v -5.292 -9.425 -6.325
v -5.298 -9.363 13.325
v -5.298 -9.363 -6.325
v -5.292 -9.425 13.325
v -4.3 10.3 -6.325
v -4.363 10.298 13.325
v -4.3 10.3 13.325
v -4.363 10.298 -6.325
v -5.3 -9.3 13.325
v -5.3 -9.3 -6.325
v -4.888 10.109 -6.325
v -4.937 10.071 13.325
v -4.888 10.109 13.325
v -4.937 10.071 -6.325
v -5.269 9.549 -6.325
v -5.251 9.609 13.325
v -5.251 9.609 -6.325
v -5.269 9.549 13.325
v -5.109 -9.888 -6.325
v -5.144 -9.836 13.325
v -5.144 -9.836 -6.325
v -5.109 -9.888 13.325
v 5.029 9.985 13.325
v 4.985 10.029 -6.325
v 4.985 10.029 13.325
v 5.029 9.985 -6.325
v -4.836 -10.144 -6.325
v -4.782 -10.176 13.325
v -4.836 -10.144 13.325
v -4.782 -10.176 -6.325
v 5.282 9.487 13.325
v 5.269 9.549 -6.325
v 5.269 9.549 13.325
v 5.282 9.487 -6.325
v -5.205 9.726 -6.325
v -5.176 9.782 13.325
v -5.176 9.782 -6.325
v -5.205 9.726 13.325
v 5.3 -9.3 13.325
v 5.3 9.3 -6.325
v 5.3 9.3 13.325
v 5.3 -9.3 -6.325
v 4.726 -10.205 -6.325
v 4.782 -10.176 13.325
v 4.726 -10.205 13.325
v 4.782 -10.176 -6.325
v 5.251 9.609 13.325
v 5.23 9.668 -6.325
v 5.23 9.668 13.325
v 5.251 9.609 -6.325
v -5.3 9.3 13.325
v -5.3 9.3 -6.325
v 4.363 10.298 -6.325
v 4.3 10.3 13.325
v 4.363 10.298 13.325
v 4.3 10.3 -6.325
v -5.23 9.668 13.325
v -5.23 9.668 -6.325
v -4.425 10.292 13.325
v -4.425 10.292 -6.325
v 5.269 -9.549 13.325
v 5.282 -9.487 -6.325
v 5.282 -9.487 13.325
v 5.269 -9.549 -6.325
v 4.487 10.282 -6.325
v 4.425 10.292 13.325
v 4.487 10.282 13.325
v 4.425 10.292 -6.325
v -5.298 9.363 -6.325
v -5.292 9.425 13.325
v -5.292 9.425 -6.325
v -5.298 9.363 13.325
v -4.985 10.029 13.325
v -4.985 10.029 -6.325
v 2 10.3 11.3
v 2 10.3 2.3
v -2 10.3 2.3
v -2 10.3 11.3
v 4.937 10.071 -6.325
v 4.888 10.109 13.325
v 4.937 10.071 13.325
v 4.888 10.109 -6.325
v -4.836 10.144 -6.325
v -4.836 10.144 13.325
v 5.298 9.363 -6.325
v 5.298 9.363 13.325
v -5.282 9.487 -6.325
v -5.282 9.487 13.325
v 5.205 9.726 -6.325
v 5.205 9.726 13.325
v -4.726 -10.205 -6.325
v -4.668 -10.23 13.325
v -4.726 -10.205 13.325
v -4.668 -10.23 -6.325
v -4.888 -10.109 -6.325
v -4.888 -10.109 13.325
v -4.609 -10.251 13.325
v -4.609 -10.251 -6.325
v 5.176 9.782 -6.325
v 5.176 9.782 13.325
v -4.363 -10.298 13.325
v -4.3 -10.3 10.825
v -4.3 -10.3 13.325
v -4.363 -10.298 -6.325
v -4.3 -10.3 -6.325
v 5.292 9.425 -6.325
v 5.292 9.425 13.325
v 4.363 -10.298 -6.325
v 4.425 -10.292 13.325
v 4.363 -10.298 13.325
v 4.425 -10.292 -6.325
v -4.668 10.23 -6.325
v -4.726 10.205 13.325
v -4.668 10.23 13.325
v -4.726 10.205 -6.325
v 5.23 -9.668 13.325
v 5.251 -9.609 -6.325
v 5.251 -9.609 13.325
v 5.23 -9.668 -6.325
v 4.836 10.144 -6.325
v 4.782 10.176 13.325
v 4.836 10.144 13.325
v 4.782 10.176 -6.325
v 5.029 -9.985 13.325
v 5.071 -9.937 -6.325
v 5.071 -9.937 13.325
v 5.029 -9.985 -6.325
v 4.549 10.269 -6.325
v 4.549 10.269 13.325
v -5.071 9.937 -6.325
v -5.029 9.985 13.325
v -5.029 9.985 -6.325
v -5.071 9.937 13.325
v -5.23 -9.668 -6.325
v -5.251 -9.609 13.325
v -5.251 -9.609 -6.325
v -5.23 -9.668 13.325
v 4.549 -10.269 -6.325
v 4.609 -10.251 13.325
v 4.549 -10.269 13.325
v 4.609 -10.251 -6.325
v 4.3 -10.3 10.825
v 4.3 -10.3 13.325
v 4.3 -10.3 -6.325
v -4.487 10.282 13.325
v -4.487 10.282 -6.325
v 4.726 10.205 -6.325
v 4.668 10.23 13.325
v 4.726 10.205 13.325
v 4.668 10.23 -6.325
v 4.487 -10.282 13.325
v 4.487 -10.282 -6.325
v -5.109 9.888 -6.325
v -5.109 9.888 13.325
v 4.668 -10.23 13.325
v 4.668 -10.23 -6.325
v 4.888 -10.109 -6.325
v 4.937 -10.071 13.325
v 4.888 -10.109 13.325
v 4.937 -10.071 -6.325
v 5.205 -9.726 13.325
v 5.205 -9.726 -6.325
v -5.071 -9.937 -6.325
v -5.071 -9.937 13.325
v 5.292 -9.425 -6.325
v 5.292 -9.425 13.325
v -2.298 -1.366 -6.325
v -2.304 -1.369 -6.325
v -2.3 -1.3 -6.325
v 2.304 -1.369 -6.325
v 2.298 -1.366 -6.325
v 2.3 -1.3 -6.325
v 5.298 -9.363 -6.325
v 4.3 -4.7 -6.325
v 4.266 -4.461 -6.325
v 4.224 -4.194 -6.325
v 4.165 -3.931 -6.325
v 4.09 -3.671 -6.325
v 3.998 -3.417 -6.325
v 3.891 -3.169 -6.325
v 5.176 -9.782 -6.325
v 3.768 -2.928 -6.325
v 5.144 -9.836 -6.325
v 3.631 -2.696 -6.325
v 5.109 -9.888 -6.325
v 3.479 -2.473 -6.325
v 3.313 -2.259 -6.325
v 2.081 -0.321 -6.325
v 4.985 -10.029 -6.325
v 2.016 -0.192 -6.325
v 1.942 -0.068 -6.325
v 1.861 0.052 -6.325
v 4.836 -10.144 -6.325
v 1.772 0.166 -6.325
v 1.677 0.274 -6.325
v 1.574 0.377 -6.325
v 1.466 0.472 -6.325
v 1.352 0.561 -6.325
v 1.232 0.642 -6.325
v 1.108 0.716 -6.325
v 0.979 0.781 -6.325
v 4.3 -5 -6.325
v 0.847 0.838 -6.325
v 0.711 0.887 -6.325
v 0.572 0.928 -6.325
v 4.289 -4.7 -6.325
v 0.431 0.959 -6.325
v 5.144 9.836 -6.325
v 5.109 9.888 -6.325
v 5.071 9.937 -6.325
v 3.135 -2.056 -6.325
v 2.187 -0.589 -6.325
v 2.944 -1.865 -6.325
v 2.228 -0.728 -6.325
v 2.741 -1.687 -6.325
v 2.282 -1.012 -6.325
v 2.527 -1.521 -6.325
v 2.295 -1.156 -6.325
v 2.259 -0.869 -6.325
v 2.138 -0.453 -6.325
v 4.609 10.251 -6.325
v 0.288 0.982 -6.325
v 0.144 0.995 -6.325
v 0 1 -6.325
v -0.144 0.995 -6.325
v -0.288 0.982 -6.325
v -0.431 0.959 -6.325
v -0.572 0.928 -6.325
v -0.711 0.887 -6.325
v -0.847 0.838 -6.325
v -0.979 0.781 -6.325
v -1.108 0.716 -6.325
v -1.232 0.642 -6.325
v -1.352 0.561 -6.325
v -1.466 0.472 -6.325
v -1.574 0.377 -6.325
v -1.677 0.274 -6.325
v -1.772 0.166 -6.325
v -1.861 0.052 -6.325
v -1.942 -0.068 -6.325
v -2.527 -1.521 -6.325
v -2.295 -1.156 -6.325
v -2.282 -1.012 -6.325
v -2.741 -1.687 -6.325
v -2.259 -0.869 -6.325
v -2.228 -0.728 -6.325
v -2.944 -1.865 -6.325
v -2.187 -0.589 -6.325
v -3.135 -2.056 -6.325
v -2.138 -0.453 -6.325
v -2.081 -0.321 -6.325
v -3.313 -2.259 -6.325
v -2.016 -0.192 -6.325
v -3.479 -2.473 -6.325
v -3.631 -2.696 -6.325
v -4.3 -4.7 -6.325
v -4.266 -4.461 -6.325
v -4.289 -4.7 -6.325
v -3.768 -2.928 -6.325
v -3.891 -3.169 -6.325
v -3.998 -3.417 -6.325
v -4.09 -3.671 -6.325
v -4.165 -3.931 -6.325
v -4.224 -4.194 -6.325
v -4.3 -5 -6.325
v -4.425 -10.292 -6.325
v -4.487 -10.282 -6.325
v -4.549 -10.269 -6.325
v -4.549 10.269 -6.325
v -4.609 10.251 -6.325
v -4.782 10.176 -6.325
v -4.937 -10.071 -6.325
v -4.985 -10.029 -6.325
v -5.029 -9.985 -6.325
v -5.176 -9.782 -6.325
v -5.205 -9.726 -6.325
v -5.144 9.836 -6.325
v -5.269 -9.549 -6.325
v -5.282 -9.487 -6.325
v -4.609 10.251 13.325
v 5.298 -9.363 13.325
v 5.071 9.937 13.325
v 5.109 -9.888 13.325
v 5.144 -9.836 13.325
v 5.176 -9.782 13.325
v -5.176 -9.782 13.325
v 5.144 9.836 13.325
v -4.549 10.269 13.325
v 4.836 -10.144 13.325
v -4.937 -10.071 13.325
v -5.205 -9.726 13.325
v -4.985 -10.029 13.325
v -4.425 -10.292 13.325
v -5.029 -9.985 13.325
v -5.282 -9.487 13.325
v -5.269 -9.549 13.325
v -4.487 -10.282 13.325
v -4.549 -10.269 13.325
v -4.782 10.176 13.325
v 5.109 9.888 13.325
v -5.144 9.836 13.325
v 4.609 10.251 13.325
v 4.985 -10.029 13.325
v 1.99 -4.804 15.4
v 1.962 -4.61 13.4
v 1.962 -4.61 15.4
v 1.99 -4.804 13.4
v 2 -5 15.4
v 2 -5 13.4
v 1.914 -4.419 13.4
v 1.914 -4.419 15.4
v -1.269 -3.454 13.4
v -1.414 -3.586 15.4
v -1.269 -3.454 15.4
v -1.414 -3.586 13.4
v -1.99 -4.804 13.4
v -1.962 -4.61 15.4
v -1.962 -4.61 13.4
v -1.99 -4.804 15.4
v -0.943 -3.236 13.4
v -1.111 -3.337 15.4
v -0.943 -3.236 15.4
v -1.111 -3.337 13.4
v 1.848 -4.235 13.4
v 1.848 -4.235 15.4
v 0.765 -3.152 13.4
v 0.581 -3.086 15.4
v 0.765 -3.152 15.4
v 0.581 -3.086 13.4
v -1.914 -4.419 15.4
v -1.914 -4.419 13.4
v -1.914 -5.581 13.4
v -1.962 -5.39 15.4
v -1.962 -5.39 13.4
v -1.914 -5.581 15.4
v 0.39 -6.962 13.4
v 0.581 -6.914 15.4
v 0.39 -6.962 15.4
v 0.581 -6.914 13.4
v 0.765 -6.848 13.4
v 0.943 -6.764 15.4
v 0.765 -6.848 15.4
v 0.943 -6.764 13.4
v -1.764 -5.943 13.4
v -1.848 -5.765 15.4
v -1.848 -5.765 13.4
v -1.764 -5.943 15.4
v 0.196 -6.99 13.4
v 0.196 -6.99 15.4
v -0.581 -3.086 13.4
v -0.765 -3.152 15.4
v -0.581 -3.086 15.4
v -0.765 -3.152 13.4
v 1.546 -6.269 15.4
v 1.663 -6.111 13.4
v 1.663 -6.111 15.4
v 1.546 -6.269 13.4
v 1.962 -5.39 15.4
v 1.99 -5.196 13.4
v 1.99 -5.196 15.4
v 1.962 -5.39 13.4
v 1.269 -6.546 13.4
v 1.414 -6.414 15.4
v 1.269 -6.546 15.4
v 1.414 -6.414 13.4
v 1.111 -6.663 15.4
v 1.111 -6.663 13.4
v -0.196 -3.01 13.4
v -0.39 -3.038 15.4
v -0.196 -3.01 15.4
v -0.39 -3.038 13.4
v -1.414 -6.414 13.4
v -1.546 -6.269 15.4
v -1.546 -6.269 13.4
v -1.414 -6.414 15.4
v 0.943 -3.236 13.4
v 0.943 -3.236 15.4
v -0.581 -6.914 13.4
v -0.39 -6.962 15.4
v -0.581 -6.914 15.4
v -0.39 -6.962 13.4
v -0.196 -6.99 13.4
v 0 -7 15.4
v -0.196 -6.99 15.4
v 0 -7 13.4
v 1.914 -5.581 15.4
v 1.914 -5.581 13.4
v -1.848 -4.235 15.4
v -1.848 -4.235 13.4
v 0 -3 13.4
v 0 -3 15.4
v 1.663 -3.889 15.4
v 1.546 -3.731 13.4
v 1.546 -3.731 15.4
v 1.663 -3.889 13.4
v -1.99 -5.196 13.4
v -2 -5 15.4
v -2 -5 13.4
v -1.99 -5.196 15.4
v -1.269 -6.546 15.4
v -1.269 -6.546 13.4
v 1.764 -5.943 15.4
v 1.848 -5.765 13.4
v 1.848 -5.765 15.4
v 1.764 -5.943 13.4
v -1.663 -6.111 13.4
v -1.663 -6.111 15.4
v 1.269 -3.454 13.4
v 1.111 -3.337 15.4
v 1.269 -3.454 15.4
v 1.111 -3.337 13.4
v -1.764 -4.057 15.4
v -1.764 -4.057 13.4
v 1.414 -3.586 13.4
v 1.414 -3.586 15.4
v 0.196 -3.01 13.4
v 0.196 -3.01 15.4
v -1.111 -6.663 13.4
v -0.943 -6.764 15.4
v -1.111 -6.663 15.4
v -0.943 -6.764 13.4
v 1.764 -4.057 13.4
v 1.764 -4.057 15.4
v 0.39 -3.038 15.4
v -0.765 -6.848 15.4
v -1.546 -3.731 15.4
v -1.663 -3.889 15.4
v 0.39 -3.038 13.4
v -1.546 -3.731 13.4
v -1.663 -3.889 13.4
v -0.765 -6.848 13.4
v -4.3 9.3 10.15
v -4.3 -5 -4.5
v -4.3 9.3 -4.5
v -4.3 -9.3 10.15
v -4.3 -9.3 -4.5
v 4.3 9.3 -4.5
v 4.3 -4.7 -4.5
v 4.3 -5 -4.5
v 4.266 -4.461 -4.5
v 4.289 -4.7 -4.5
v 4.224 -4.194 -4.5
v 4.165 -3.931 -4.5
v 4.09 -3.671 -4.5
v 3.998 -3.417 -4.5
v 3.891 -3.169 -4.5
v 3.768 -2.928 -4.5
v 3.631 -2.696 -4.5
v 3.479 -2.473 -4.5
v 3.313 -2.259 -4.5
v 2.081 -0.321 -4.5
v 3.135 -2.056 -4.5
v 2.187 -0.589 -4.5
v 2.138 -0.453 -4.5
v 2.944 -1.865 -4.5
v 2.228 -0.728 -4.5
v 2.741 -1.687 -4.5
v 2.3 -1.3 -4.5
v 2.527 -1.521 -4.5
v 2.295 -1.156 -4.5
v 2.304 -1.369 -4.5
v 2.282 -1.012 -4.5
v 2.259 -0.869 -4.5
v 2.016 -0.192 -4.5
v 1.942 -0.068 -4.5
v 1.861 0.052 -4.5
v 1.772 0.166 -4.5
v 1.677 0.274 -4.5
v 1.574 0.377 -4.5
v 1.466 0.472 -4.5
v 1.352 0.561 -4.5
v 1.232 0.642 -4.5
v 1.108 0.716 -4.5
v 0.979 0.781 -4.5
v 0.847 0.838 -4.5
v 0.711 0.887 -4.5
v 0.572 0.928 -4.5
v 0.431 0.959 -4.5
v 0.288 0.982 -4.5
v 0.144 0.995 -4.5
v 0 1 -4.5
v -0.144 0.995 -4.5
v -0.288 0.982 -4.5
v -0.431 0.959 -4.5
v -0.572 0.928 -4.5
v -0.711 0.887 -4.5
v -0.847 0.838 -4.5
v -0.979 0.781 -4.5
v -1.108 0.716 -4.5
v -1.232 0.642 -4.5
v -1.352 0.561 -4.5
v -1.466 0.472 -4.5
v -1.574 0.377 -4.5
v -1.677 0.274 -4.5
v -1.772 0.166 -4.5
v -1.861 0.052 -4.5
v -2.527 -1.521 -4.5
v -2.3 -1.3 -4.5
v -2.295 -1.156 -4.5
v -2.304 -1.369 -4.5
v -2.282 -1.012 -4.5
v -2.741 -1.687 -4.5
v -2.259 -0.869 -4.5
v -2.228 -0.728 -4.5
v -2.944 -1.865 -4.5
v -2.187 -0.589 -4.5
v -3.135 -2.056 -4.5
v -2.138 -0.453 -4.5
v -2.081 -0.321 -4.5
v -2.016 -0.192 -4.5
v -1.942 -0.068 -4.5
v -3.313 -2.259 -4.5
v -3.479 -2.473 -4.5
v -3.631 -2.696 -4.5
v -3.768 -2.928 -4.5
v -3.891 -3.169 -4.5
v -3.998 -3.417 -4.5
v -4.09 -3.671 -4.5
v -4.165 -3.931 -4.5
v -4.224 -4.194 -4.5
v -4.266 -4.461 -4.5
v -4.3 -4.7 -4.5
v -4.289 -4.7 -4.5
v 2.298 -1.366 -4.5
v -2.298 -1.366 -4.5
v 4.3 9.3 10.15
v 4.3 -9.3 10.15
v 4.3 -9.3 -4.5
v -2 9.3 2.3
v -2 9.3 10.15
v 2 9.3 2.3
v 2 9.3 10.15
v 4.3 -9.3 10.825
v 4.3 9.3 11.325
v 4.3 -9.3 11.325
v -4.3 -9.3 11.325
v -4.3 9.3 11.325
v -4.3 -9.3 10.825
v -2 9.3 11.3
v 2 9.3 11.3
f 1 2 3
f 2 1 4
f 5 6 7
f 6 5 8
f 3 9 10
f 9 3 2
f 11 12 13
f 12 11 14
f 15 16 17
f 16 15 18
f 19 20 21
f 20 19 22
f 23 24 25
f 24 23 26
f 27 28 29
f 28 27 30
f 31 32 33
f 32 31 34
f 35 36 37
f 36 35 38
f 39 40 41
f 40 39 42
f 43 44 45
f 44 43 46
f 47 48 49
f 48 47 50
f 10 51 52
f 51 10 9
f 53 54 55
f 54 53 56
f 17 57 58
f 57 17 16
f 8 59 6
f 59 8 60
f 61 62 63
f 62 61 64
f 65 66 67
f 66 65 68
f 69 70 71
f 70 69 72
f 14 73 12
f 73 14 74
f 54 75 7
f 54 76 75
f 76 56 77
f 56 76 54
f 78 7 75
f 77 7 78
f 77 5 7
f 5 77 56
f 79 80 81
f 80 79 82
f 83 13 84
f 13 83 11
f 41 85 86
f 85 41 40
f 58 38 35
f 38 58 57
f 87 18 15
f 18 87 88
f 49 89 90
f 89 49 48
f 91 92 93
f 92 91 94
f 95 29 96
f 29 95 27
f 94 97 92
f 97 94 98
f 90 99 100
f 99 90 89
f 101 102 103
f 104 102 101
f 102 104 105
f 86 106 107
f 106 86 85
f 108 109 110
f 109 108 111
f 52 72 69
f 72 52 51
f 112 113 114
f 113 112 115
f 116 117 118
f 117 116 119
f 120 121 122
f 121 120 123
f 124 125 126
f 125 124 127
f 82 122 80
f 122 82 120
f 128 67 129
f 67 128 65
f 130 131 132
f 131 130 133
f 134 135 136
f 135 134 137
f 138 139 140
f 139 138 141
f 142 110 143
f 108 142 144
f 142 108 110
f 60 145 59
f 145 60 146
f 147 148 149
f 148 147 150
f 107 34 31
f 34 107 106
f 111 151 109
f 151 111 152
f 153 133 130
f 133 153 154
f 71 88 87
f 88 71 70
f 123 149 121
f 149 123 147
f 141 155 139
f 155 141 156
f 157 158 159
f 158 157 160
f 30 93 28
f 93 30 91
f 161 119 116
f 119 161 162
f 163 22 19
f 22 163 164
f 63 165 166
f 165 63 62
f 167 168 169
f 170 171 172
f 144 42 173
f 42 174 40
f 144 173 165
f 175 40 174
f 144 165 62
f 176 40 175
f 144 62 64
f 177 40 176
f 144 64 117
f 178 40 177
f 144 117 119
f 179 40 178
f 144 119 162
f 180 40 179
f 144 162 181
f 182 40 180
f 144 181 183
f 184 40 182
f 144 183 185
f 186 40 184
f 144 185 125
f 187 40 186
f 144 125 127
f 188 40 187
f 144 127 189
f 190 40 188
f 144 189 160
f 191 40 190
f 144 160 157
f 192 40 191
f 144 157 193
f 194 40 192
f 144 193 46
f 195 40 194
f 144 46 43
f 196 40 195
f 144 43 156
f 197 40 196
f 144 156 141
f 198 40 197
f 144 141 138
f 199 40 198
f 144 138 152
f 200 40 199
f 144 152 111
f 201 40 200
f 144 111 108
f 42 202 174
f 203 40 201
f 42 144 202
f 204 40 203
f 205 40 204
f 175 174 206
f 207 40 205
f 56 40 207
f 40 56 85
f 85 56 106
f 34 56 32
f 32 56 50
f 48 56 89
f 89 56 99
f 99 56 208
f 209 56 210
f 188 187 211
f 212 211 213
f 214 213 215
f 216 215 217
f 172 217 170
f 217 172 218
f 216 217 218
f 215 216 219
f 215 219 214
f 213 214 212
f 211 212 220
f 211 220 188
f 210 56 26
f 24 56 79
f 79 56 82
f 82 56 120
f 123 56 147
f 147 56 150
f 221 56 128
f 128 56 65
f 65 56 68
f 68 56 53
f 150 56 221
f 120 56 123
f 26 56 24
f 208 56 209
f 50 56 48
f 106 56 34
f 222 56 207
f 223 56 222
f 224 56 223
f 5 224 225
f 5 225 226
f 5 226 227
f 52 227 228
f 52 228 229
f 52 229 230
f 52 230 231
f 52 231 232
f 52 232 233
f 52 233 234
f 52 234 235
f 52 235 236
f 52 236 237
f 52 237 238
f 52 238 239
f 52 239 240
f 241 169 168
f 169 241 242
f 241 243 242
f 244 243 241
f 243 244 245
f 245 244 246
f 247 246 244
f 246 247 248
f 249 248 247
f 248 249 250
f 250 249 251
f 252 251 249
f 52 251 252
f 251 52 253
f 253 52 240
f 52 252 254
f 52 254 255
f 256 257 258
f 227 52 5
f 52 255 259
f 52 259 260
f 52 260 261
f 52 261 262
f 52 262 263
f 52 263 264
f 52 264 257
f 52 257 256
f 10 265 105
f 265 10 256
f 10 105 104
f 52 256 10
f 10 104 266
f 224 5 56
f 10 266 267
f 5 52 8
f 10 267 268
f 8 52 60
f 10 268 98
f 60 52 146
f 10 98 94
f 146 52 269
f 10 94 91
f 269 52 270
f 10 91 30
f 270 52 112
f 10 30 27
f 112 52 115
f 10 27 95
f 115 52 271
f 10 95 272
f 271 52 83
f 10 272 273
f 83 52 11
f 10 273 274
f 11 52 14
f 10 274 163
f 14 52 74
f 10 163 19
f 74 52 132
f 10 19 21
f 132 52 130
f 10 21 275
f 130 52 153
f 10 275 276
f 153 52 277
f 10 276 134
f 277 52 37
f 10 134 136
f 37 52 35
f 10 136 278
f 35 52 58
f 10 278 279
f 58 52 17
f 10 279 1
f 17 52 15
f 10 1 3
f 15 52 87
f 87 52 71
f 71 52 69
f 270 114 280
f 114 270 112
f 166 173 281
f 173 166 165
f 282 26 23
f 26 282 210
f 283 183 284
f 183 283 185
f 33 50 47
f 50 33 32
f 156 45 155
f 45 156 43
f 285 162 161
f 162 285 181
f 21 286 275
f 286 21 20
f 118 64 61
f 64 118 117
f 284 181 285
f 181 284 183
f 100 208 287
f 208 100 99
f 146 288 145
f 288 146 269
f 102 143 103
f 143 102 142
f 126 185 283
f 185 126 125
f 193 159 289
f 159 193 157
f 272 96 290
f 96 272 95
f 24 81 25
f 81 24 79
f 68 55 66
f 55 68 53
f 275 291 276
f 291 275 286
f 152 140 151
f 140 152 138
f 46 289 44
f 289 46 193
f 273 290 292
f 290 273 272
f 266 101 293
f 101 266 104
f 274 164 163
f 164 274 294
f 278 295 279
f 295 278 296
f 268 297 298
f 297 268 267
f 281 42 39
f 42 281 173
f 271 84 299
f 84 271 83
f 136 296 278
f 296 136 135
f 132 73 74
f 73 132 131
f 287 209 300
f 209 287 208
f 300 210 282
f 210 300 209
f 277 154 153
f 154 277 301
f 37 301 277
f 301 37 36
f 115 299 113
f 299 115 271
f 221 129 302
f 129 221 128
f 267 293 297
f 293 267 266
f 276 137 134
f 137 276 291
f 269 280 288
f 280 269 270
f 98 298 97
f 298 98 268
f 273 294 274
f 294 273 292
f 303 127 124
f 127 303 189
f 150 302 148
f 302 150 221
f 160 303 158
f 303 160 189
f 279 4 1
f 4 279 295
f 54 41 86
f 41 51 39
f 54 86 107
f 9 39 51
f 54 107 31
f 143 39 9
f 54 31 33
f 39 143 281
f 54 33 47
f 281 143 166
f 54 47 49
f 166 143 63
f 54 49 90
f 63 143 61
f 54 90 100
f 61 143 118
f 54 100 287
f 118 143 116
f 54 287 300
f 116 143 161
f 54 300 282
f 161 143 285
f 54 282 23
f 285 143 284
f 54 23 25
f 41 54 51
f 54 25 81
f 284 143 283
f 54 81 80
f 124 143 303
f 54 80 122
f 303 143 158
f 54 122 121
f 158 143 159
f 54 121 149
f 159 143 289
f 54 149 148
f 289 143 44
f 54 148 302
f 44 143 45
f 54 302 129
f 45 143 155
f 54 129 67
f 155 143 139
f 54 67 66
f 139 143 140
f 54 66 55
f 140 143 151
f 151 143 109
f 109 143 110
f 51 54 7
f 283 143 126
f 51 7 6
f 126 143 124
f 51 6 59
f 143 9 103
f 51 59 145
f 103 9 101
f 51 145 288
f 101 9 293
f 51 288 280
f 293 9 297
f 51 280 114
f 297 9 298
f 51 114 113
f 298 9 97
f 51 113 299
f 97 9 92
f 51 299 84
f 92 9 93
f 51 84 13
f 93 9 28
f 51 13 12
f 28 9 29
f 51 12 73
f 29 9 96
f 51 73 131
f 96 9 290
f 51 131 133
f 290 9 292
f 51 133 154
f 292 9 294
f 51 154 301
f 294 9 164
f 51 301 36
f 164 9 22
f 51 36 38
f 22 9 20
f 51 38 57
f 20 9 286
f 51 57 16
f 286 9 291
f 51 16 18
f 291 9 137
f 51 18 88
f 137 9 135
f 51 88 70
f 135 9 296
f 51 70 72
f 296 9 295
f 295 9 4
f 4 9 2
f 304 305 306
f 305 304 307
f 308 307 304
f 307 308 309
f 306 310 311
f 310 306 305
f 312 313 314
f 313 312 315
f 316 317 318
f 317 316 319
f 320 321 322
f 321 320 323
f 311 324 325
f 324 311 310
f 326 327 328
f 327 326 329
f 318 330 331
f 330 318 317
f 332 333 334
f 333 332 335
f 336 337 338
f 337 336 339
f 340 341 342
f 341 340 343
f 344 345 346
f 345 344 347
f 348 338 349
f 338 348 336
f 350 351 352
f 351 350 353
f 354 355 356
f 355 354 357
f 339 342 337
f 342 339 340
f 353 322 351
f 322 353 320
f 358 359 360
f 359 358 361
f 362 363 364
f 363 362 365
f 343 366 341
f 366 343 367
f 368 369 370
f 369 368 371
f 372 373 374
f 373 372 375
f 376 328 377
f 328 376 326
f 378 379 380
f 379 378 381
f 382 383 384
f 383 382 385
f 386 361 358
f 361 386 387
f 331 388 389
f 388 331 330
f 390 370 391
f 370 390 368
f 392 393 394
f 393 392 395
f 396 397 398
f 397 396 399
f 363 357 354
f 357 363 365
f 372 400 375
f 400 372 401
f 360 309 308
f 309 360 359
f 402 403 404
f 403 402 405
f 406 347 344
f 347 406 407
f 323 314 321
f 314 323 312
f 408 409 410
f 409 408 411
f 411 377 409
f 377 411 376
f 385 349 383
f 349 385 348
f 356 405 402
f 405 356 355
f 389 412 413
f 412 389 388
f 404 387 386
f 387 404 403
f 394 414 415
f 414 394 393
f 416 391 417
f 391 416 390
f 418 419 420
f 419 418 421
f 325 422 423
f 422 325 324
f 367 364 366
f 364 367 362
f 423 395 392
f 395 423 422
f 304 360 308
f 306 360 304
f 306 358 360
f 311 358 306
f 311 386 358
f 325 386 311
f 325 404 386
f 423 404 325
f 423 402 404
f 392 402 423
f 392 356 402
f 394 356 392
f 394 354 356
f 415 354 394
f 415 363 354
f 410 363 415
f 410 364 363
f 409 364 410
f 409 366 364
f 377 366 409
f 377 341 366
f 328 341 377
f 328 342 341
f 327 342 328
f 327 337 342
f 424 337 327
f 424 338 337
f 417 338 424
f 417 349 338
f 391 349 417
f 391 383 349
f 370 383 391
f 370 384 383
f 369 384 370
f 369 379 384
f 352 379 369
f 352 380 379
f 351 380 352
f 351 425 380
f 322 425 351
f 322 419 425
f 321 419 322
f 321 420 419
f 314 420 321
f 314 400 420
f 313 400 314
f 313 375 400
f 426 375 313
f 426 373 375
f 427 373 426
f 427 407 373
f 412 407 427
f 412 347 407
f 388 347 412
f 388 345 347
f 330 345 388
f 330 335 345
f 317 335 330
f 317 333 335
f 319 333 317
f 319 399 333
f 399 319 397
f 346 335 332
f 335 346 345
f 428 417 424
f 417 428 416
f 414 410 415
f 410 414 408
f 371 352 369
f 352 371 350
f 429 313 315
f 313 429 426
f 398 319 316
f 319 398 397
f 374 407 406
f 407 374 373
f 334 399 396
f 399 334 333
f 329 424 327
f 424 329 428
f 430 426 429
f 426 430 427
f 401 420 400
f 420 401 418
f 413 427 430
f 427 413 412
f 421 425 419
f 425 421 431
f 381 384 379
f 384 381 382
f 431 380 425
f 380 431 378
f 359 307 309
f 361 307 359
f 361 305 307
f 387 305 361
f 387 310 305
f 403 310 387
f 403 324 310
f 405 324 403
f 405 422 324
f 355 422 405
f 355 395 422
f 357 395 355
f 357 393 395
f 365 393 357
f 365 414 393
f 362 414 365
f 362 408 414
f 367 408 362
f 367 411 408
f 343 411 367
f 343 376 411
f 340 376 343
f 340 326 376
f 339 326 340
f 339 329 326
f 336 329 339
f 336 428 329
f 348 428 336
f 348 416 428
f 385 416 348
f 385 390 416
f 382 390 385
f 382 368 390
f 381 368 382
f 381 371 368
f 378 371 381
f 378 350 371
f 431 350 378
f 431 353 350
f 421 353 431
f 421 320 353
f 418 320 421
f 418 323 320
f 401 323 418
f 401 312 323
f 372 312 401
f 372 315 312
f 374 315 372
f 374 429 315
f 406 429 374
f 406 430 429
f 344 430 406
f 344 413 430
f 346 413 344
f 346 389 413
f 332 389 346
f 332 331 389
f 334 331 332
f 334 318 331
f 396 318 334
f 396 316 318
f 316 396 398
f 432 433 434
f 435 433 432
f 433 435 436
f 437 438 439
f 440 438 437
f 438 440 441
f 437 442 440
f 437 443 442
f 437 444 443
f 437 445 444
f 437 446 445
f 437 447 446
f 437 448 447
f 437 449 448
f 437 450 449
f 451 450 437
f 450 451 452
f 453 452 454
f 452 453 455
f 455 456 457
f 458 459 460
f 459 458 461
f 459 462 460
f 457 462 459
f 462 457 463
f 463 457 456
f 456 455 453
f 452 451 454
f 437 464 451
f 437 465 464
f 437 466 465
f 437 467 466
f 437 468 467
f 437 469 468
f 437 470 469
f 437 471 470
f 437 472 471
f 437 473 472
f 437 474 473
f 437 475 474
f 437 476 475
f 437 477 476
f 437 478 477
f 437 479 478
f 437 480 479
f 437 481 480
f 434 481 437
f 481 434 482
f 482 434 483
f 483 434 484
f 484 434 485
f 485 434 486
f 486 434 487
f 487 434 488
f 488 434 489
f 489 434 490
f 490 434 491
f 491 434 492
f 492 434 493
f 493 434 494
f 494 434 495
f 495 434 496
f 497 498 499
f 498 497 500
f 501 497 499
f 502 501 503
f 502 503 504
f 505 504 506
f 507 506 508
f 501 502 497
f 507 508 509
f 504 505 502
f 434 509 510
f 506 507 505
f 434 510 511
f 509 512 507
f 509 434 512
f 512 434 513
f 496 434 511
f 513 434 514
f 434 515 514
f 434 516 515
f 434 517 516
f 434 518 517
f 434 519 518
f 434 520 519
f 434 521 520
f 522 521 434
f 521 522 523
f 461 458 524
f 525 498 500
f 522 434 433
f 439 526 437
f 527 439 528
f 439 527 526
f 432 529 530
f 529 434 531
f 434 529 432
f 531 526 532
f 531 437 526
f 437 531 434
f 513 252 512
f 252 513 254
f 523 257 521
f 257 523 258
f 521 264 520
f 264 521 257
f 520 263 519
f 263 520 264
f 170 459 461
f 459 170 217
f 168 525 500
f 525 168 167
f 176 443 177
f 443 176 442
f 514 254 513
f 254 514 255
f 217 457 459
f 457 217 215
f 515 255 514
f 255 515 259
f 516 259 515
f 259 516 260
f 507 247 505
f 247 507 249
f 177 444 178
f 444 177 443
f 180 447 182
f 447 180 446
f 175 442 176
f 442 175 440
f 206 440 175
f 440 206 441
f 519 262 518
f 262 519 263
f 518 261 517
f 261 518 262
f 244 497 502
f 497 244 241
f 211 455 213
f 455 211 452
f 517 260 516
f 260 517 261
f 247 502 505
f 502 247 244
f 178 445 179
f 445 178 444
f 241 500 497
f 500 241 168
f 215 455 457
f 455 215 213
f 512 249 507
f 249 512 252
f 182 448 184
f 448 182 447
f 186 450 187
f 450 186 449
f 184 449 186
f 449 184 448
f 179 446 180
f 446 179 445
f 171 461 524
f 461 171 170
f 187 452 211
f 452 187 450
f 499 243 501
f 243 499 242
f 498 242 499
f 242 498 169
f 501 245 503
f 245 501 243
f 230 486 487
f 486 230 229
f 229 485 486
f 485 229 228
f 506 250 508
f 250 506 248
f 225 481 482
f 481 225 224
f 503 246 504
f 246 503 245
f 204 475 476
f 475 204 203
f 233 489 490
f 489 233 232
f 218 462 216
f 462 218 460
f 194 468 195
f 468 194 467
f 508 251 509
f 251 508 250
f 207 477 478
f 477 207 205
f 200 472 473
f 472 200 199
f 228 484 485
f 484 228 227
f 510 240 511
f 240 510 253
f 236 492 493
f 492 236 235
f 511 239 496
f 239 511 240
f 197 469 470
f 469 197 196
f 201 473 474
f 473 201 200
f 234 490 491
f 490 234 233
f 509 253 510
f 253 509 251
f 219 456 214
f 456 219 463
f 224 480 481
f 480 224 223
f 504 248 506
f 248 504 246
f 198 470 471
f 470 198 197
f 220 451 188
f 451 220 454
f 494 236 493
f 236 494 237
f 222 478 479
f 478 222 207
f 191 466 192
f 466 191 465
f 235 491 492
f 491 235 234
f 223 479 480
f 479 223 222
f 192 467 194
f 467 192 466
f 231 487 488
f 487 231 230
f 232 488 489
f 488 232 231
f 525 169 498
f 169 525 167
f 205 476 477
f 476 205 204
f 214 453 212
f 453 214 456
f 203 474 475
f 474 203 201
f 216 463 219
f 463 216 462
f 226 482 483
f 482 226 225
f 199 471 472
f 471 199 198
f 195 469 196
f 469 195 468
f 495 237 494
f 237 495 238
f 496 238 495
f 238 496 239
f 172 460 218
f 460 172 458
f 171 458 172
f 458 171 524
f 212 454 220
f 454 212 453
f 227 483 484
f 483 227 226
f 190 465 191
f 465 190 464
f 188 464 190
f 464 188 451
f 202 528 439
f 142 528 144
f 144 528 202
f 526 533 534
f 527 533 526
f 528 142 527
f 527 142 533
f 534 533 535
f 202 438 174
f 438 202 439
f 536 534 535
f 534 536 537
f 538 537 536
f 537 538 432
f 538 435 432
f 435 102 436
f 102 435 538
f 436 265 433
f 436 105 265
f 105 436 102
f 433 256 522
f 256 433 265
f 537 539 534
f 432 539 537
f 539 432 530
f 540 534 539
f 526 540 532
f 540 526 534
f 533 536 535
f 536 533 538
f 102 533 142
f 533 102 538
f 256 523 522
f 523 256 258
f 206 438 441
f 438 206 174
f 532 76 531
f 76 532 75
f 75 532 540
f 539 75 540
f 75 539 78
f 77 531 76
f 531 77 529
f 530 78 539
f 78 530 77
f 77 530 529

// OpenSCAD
// file: electronics.scad
/* (c) 2016++ by Saarbastler 
**  https://github.com/saarbastler/library.scad
**
** Raspberry PI model library for generating cases etc.
*/
$fn=100;

module header(pins, rows)
{
  color("darkgrey") cube([2.54*pins,2.54*rows,1.27]);
  
  for(x=[0:pins-1],y=[0:rows-1])
    translate([x*2.54+(1.27+.6)/2,y*2.54+(1.27+.6)/2,-3.5]) cube([0.6,0.6,11.5]);
}


module pi_zero()
{
  // PCB
  color("limegreen") difference()
  {
    hull()
    {
      translate([-(65-6)/2,-(30-6)/2,0]) cylinder(r=3, h=1.4 );
      translate([-(65-6)/2, (30-6)/2,0]) cylinder(r=3, h=1.4 );
      translate([ (65-6)/2,-(30-6)/2,0]) cylinder(r=3, h=1.4 );
      translate([ (65-6)/2, (30-6)/2,0]) cylinder(r=3, h=1.4 );
    }
    
    translate([-65/2+3.5,-30/2+3.5,-1]) #cylinder(d=2.75, h=3);
    translate([-65/2+3.5, 30/2-3.5,-1]) #cylinder(d=2.75, h=3);
    translate([65/2-3.5,-30/2+3.5,-1]) #cylinder(d=2.75, h=3);
    translate([65/2-3.5, 30/2-3.5,-1]) #cylinder(d=2.75, h=3);
  }
  
  // Header
  translate([-10*2.54,30/2-2.54-3.5,1.4])
    header(20,2);
  
  translate([-65/2,-30/2,1.4])  
  {
    color("silver") 
    {
      
      // micro USB
      translate([41-8/2,-1.5,0]) cube([8,6,2.6]);
      translate([54-8/2,-1.5,0]) cube([8,6,2.6]);        
      
      // HDMI
      translate([6.9,-1.5,0]) cube([13,7,3]);
    }
    
    color("darkgrey") 
    {
      
      // Camera
      translate([64-4/2,7.1,0]) cube([4,16,2.5]);
    }
    
    // Micro SD Card
    color("silver") translate([0,8.6,-0]) cube([13,14,1.5]);    
    color("darkgrey") translate([-2.4,10.1,0]) cube([2.4,11,1]);
  }
}



module pca9685(withHeader=true)
{  
  
    // PCB
    color("limegreen") difference()
    {
      translate([0,0,0]) hull()
      {
        translate([-(62.5-6)/2,-(25.4-6)/2,0]) cylinder(r=3, h=1.4 );
        translate([-(62.5-6)/2, (25.4-6)/2,0]) cylinder(r=3, h=1.4 );
        translate([ (62.5-6)/2,-(25.4-6)/2,0]) cylinder(r=3, h=1.4 );
        translate([ (62.5-6)/2, (25.4-6)/2,0]) cylinder(r=3, h=1.4 );
      }
      
      translate([-55.9/2,-18.8/2,-1]) cylinder(d=2.75, h=3);
      translate([-55.9/2, 18.8/2,-1]) cylinder(d=2.75, h=3);
      translate([55.9/2,-18.8/2,-1]) cylinder(d=2.75, h=3);
      translate([55.9/2, 18.8/2,-1]) cylinder(d=2.75, h=3);
    } 
    
    
    // capacitor
    color("silver")
    translate([-(62.5/2)+17.1,(25.4-8.3)/2,1.4])
    cylinder(d=8.3, h=12.7);
    
    //power connector
    color("blue")
    translate([-(62.5/2)+25.1+2.54*2,(25.4-8.3)/2,1.4])
    cube([2.54*2,4,8]);
    
    // Header top
    translate([-(62.5/2)+5.65,-25.4/2,1.4])
    header(4,3);
    
    translate([2.25,-25.4/2,1.4])
    header(4,3);
    
    translate([-2.25-2.54*4,-25.4/2,1.4])
    header(4,3);
    
    translate([62.5/2-5.65-2.54*4,-25.4/2,1.4])
    header(4,3);
    
    translate([62.5/2,-25.4/2+5.08,1.4])
    rotate([0,0,90])
    header(6,1);
    
    translate([-62.5/2+2.54,-25.4/2+5.08,1.4])
    rotate([0,0,90])
    header(6,1);

  
}

module dc_dc(){
    
    // PCB
    color("limegreen") difference()
    {
      translate([0,0,0]) hull()
      {
        translate([-(24.5-6)/2,-(48-6)/2,0]) cylinder(r=3, h=1.4 );
        translate([-(24.5-6)/2, (48-6)/2,0]) cylinder(r=3, h=1.4 );
        translate([ (24.5-6)/2,-(48-6)/2,0]) cylinder(r=3, h=1.4 );
        translate([ (24.5-6)/2, (48-6)/2,0]) cylinder(r=3, h=1.4 );
      }
      
      translate([0,0,-1]) {
            
            //translate([-17/2,-35/2,0])
            //cylinder(d=3.15, h=2.5);
            
            translate([-17/2,35/2, 0])
            cylinder(d=3.15, h=2.5);
            
            translate([17/2,-35/2, 0])
            cylinder(d=3.15, h=2.5);
            
            //translate([17/2,35/2, 0])
            //cylinder(d=3.15, h=2.5); 
          
      }


    } 
    
    
    // capacitors
    color("darkblue")
    translate([-(24.5/2)+12.1,(48-8)/2,1.4])
    cylinder(d=8, h=10);
    
    color("darkblue")
    translate([-(24.5/2)+12.1,-(48-8)/2,1.4])
    cylinder(d=8, h=10);
    
    //toroid
    
    difference(){
        
        color("orange")
        translate([(24.5/2)-22.1+9,(48-30)/2,1.4])
        cylinder(d=12, h=7.6);
        
        color("orange")
        translate([(24.5/2)-22.1+9,(48-30)/2,0.5])
        cylinder(d=6, h=11);

        
    }
    
    
    //potentiometer
    color("blue")
    translate([24.5/2-2,-48/2+9,1.4])
    rotate([0,0,90])
    cube([5,10,11]);
    
    
    //IC
    color("black")
    translate([24.5/2-8,-48/2+15,1.4])
    rotate([0,0,90])
    cube([11,11,5]);
    
    
}


module on_off_switch(){
    
    union(){
        
        color("silver")
        translate([-8/2, -4/2, 0])
        cube([8, 4, 3.8]);
        
        color("black")
        translate([-1.5/2, -1.5/2, 3.8])
        cube([1.5, 1.5, 3]);
        
        color("silver")
        translate([-0.5/2, -0.5/2, -3.2])
        cube([0.5, 0.5, 3.2]);
        
        color("silver")
        translate([-0.5/2-2.5, -0.5/2, -3.2])
        cube([0.5, 0.5, 3.2]);
        
        color("silver")
        translate([-0.5/2+2.5, -0.5/2, -3.2])
        cube([0.5, 0.5, 3.2]);
        
        
        
        
    }
    
}


module pi_camera(){
    difference(){
        union(){
            color("limegreen")
            translate([-25.5/2, -24.5/2, 0])
            cube([25.5, 24.5, 0.9]);
            
            
            //camera sensor
            color("darkgrey")
            translate([-8.5/2, -8.5/2+2.4, 0.9])
            cube([8.5, 8.5, 3.5]);
            
            color("darkgrey")
            translate([0, 2.4, 0.9+3.5])
            cylinder(d=8, h=0.75, $fn=32);
        
            color("darkgrey")
            translate([0, 2.4, 0.9+3.5+0.75])
            cylinder(d=6, h=0.75, $fn=32);
            
            color("darkgrey")
            translate([0, 2.4, 0.9+3.5+0.75+0.75])
            cylinder(d1=2, d2=5, h=2, $fn=32);
            
            //sensor connector
            color("orange")
            translate([-8.5/2, -8.5/2+2.4-10.5, 0.9])
            cube([8.5, 10.5, 2.5]);
            
            //led
            color("white")
            translate([-20/2, -8.5/2+2.4-7, 0.9])
            cube([20, 3, 1]);            
            
            
            //connector
            color("white")
            translate([-20.8/2, -5.5+24/2, -2.4])
            cube([20.8, 5.5, 2.4]);
            
            
    
        }
          
        translate([-21/2,-20/2,-1]) cylinder(d=2.1, h=3);
        translate([-21/2, 20/2-7.5,-1]) cylinder(d=2.1, h=3);
        translate([21/2,-20/2,-1]) cylinder(d=2.1, h=3);
        translate([21/2, 20/2-7.5,-1]) cylinder(d=2.1, h=3);
    }
    
    
}

//on_off_switch();

//pi_zero();

//translate ([0,100,0])
//pca9685();

//dc_dc();

//pi_camera();
// file: servo_5g.scad
//servo_5g();

//use<hub_mount.scad>
//use<MCAD/nuts_and_bolts.scad>
$fn = 24;
//x,y,z => l,w,h

tap_r = 0.85;
hole_r = 1.0;

servo5_l         = 8.6; 
servo5_w         = 18.6; 
body5_h          = 14.65;



hub5_h = 2.15;
small_hub5_r = 4.6/2;  
horn5_r = 4.66/2;
horn5_h = 3;

servo5_h         = body5_h+hub5_h+horn5_h;

module servo_5g() {
  
    translate([-servo5_l/2, -servo5_w/2, -body5_h/2-hub5_h/2-horn5_h/2]) {
    
        color("white") 
        translate([servo5_l/2,servo5_l/2,body5_h+hub5_h])
        cylinder(r=horn5_r,h=horn5_h);
        
        color("deepSkyBlue",.7) //deepSkyBlue
        union() {
            cube([servo5_l,servo5_w,body5_h]);
            translate([servo5_l/2,servo5_l/2,body5_h])
            cylinder(r=servo5_l/2,h=hub5_h);
            translate([servo5_l/2,servo5_l/2+3.7,body5_h])
            cylinder(r=small_hub5_r,h=hub5_h);
            
        }
    }
}
// file: servo_12g.scad
//servo_12g();

//use<hub_mount.scad>
//use<MCAD/nuts_and_bolts.scad>
$fn = 24;
//x,y,z => l,w,h

tap_r = 0.85;
hole_r = 1.0;

servo_l         = 12;  // was 12
servo_w         = 24;  // was 23
body_h          = 20.80;

servo_h         = 27; //not used in code was 27

wing_w          = 4.5;
wing_h          = 2.33;
wing_place      = 16.3;   
hole_offset     = 2.2;    //not checked
mount_hole_r    = 2/2;
mount_slot      = 1;

servo_ww        = servo_w+wing_w*2; // not used in code but is handy number

hub_h           = 4;
small_hub_r     = 6.15/2;  
horn_r          = 4.66/2;
horn_h          = 3;

wire_l          = 4;
wire_w          = 1.5;
wire_h          = 1;
wire_place      = 4.8;

servo_full_w    = servo_w+wing_w*2;
module servo_12g() {
  
    translate([-servo_l/2, -servo_w/2, -body_h/2-hub_h/2-horn_h/2]) {
    
        color("white") 
        translate([servo_l/2,servo_l/2,body_h+hub_h])
        cylinder(r=horn_r,h=horn_h);
        
        color("deepSkyBlue",.7) //deepSkyBlue
        union() {
            cube([servo_l,servo_w,body_h]);
            translate([servo_l/2,servo_l/2,body_h])
            cylinder(r=servo_l/2,h=hub_h);
            translate([servo_l/2,servo_l/2+6.30,body_h])
            cylinder(r=small_hub_r,h=hub_h);
            
        }
    }
}

module roundedRect(size, radius)
{
x = size[0];
y = size[1];
z = size[2];

translate([x/2+radius/2, y/2+radius/2, 0]){
linear_extrude(height=z)
hull()
{
// place 4 circles in the corners, with the given radius
translate([(-x/2)+(radius/2), (-y/2)+(radius/2), 0])
circle(r=radius);

translate([(x/2)-(radius/2), (-y/2)+(radius/2), 0])
circle(r=radius);

translate([(-x/2)+(radius/2), (y/2)-(radius/2), 0])
circle(r=radius);

translate([(x/2)-(radius/2), (y/2)-(radius/2), 0])
circle(r=radius);
}
}
}
// main file
include <servo_12g.scad>
include <servo_5g.scad>
include <electronics.scad>

rad = 2;

mount_x = servo5_l + 2;
mount_y = servo5_w + 2;
mount_round = 1;
servo_tol = 0.2;
servo5_x     = servo5_l + servo_tol*2; //~12
servo5_y     = servo5_w + servo_tol*8; //~23

// 8, 4.6, length =10 


Citro6_32();

module Citro6_32(){

echo("mount_y: ", mount_y);
    
    mount5_x = servo5_l + 2;
    mount5_y = servo5_w + 2;
    mount_round = 1;
    servo_tol = 0.2;
    

difference() {
        union() {
            translate([-mount5_x/2,-mount5_y/2,-body5_h/2+1])
            roundedRect([mount5_x-mount_round,mount5_y-mount_round,body5_h+5], mount_round);
            
            translate([0, -5, body5_h-1.25])
            cylinder(d=4, h=2, $fn=64);
            

            
        }
    translate([0,0,4])
    cube([servo5_l, servo5_w, body5_h], center=true);
        
    translate([0,-9-5,1.5])
    cube([servo5_l, servo5_w, body5_h+4], center=true);
        
    
    
    translate([0,0,0.25])
    //translate([(mount5_x-servo5_y)/2+servo5_y-4*servo_tol,(mount5_y-servo5_l)/2,2])
    rotate([0,180,0])
    servo_5g(false);
        
    translate([0,9+1,6.8])
    cube([4, 5, 9], center=true);
        
    
    
    ////translate([(mount5_x-servo_y)/2+servo_y-4*servo_tol,(mount5_y-servo_l)/2,2])
    //translate([8,servo_l+2,2])
    //rotate([0,0,-90])
    //servo_60g(false);
    



    
}
}
